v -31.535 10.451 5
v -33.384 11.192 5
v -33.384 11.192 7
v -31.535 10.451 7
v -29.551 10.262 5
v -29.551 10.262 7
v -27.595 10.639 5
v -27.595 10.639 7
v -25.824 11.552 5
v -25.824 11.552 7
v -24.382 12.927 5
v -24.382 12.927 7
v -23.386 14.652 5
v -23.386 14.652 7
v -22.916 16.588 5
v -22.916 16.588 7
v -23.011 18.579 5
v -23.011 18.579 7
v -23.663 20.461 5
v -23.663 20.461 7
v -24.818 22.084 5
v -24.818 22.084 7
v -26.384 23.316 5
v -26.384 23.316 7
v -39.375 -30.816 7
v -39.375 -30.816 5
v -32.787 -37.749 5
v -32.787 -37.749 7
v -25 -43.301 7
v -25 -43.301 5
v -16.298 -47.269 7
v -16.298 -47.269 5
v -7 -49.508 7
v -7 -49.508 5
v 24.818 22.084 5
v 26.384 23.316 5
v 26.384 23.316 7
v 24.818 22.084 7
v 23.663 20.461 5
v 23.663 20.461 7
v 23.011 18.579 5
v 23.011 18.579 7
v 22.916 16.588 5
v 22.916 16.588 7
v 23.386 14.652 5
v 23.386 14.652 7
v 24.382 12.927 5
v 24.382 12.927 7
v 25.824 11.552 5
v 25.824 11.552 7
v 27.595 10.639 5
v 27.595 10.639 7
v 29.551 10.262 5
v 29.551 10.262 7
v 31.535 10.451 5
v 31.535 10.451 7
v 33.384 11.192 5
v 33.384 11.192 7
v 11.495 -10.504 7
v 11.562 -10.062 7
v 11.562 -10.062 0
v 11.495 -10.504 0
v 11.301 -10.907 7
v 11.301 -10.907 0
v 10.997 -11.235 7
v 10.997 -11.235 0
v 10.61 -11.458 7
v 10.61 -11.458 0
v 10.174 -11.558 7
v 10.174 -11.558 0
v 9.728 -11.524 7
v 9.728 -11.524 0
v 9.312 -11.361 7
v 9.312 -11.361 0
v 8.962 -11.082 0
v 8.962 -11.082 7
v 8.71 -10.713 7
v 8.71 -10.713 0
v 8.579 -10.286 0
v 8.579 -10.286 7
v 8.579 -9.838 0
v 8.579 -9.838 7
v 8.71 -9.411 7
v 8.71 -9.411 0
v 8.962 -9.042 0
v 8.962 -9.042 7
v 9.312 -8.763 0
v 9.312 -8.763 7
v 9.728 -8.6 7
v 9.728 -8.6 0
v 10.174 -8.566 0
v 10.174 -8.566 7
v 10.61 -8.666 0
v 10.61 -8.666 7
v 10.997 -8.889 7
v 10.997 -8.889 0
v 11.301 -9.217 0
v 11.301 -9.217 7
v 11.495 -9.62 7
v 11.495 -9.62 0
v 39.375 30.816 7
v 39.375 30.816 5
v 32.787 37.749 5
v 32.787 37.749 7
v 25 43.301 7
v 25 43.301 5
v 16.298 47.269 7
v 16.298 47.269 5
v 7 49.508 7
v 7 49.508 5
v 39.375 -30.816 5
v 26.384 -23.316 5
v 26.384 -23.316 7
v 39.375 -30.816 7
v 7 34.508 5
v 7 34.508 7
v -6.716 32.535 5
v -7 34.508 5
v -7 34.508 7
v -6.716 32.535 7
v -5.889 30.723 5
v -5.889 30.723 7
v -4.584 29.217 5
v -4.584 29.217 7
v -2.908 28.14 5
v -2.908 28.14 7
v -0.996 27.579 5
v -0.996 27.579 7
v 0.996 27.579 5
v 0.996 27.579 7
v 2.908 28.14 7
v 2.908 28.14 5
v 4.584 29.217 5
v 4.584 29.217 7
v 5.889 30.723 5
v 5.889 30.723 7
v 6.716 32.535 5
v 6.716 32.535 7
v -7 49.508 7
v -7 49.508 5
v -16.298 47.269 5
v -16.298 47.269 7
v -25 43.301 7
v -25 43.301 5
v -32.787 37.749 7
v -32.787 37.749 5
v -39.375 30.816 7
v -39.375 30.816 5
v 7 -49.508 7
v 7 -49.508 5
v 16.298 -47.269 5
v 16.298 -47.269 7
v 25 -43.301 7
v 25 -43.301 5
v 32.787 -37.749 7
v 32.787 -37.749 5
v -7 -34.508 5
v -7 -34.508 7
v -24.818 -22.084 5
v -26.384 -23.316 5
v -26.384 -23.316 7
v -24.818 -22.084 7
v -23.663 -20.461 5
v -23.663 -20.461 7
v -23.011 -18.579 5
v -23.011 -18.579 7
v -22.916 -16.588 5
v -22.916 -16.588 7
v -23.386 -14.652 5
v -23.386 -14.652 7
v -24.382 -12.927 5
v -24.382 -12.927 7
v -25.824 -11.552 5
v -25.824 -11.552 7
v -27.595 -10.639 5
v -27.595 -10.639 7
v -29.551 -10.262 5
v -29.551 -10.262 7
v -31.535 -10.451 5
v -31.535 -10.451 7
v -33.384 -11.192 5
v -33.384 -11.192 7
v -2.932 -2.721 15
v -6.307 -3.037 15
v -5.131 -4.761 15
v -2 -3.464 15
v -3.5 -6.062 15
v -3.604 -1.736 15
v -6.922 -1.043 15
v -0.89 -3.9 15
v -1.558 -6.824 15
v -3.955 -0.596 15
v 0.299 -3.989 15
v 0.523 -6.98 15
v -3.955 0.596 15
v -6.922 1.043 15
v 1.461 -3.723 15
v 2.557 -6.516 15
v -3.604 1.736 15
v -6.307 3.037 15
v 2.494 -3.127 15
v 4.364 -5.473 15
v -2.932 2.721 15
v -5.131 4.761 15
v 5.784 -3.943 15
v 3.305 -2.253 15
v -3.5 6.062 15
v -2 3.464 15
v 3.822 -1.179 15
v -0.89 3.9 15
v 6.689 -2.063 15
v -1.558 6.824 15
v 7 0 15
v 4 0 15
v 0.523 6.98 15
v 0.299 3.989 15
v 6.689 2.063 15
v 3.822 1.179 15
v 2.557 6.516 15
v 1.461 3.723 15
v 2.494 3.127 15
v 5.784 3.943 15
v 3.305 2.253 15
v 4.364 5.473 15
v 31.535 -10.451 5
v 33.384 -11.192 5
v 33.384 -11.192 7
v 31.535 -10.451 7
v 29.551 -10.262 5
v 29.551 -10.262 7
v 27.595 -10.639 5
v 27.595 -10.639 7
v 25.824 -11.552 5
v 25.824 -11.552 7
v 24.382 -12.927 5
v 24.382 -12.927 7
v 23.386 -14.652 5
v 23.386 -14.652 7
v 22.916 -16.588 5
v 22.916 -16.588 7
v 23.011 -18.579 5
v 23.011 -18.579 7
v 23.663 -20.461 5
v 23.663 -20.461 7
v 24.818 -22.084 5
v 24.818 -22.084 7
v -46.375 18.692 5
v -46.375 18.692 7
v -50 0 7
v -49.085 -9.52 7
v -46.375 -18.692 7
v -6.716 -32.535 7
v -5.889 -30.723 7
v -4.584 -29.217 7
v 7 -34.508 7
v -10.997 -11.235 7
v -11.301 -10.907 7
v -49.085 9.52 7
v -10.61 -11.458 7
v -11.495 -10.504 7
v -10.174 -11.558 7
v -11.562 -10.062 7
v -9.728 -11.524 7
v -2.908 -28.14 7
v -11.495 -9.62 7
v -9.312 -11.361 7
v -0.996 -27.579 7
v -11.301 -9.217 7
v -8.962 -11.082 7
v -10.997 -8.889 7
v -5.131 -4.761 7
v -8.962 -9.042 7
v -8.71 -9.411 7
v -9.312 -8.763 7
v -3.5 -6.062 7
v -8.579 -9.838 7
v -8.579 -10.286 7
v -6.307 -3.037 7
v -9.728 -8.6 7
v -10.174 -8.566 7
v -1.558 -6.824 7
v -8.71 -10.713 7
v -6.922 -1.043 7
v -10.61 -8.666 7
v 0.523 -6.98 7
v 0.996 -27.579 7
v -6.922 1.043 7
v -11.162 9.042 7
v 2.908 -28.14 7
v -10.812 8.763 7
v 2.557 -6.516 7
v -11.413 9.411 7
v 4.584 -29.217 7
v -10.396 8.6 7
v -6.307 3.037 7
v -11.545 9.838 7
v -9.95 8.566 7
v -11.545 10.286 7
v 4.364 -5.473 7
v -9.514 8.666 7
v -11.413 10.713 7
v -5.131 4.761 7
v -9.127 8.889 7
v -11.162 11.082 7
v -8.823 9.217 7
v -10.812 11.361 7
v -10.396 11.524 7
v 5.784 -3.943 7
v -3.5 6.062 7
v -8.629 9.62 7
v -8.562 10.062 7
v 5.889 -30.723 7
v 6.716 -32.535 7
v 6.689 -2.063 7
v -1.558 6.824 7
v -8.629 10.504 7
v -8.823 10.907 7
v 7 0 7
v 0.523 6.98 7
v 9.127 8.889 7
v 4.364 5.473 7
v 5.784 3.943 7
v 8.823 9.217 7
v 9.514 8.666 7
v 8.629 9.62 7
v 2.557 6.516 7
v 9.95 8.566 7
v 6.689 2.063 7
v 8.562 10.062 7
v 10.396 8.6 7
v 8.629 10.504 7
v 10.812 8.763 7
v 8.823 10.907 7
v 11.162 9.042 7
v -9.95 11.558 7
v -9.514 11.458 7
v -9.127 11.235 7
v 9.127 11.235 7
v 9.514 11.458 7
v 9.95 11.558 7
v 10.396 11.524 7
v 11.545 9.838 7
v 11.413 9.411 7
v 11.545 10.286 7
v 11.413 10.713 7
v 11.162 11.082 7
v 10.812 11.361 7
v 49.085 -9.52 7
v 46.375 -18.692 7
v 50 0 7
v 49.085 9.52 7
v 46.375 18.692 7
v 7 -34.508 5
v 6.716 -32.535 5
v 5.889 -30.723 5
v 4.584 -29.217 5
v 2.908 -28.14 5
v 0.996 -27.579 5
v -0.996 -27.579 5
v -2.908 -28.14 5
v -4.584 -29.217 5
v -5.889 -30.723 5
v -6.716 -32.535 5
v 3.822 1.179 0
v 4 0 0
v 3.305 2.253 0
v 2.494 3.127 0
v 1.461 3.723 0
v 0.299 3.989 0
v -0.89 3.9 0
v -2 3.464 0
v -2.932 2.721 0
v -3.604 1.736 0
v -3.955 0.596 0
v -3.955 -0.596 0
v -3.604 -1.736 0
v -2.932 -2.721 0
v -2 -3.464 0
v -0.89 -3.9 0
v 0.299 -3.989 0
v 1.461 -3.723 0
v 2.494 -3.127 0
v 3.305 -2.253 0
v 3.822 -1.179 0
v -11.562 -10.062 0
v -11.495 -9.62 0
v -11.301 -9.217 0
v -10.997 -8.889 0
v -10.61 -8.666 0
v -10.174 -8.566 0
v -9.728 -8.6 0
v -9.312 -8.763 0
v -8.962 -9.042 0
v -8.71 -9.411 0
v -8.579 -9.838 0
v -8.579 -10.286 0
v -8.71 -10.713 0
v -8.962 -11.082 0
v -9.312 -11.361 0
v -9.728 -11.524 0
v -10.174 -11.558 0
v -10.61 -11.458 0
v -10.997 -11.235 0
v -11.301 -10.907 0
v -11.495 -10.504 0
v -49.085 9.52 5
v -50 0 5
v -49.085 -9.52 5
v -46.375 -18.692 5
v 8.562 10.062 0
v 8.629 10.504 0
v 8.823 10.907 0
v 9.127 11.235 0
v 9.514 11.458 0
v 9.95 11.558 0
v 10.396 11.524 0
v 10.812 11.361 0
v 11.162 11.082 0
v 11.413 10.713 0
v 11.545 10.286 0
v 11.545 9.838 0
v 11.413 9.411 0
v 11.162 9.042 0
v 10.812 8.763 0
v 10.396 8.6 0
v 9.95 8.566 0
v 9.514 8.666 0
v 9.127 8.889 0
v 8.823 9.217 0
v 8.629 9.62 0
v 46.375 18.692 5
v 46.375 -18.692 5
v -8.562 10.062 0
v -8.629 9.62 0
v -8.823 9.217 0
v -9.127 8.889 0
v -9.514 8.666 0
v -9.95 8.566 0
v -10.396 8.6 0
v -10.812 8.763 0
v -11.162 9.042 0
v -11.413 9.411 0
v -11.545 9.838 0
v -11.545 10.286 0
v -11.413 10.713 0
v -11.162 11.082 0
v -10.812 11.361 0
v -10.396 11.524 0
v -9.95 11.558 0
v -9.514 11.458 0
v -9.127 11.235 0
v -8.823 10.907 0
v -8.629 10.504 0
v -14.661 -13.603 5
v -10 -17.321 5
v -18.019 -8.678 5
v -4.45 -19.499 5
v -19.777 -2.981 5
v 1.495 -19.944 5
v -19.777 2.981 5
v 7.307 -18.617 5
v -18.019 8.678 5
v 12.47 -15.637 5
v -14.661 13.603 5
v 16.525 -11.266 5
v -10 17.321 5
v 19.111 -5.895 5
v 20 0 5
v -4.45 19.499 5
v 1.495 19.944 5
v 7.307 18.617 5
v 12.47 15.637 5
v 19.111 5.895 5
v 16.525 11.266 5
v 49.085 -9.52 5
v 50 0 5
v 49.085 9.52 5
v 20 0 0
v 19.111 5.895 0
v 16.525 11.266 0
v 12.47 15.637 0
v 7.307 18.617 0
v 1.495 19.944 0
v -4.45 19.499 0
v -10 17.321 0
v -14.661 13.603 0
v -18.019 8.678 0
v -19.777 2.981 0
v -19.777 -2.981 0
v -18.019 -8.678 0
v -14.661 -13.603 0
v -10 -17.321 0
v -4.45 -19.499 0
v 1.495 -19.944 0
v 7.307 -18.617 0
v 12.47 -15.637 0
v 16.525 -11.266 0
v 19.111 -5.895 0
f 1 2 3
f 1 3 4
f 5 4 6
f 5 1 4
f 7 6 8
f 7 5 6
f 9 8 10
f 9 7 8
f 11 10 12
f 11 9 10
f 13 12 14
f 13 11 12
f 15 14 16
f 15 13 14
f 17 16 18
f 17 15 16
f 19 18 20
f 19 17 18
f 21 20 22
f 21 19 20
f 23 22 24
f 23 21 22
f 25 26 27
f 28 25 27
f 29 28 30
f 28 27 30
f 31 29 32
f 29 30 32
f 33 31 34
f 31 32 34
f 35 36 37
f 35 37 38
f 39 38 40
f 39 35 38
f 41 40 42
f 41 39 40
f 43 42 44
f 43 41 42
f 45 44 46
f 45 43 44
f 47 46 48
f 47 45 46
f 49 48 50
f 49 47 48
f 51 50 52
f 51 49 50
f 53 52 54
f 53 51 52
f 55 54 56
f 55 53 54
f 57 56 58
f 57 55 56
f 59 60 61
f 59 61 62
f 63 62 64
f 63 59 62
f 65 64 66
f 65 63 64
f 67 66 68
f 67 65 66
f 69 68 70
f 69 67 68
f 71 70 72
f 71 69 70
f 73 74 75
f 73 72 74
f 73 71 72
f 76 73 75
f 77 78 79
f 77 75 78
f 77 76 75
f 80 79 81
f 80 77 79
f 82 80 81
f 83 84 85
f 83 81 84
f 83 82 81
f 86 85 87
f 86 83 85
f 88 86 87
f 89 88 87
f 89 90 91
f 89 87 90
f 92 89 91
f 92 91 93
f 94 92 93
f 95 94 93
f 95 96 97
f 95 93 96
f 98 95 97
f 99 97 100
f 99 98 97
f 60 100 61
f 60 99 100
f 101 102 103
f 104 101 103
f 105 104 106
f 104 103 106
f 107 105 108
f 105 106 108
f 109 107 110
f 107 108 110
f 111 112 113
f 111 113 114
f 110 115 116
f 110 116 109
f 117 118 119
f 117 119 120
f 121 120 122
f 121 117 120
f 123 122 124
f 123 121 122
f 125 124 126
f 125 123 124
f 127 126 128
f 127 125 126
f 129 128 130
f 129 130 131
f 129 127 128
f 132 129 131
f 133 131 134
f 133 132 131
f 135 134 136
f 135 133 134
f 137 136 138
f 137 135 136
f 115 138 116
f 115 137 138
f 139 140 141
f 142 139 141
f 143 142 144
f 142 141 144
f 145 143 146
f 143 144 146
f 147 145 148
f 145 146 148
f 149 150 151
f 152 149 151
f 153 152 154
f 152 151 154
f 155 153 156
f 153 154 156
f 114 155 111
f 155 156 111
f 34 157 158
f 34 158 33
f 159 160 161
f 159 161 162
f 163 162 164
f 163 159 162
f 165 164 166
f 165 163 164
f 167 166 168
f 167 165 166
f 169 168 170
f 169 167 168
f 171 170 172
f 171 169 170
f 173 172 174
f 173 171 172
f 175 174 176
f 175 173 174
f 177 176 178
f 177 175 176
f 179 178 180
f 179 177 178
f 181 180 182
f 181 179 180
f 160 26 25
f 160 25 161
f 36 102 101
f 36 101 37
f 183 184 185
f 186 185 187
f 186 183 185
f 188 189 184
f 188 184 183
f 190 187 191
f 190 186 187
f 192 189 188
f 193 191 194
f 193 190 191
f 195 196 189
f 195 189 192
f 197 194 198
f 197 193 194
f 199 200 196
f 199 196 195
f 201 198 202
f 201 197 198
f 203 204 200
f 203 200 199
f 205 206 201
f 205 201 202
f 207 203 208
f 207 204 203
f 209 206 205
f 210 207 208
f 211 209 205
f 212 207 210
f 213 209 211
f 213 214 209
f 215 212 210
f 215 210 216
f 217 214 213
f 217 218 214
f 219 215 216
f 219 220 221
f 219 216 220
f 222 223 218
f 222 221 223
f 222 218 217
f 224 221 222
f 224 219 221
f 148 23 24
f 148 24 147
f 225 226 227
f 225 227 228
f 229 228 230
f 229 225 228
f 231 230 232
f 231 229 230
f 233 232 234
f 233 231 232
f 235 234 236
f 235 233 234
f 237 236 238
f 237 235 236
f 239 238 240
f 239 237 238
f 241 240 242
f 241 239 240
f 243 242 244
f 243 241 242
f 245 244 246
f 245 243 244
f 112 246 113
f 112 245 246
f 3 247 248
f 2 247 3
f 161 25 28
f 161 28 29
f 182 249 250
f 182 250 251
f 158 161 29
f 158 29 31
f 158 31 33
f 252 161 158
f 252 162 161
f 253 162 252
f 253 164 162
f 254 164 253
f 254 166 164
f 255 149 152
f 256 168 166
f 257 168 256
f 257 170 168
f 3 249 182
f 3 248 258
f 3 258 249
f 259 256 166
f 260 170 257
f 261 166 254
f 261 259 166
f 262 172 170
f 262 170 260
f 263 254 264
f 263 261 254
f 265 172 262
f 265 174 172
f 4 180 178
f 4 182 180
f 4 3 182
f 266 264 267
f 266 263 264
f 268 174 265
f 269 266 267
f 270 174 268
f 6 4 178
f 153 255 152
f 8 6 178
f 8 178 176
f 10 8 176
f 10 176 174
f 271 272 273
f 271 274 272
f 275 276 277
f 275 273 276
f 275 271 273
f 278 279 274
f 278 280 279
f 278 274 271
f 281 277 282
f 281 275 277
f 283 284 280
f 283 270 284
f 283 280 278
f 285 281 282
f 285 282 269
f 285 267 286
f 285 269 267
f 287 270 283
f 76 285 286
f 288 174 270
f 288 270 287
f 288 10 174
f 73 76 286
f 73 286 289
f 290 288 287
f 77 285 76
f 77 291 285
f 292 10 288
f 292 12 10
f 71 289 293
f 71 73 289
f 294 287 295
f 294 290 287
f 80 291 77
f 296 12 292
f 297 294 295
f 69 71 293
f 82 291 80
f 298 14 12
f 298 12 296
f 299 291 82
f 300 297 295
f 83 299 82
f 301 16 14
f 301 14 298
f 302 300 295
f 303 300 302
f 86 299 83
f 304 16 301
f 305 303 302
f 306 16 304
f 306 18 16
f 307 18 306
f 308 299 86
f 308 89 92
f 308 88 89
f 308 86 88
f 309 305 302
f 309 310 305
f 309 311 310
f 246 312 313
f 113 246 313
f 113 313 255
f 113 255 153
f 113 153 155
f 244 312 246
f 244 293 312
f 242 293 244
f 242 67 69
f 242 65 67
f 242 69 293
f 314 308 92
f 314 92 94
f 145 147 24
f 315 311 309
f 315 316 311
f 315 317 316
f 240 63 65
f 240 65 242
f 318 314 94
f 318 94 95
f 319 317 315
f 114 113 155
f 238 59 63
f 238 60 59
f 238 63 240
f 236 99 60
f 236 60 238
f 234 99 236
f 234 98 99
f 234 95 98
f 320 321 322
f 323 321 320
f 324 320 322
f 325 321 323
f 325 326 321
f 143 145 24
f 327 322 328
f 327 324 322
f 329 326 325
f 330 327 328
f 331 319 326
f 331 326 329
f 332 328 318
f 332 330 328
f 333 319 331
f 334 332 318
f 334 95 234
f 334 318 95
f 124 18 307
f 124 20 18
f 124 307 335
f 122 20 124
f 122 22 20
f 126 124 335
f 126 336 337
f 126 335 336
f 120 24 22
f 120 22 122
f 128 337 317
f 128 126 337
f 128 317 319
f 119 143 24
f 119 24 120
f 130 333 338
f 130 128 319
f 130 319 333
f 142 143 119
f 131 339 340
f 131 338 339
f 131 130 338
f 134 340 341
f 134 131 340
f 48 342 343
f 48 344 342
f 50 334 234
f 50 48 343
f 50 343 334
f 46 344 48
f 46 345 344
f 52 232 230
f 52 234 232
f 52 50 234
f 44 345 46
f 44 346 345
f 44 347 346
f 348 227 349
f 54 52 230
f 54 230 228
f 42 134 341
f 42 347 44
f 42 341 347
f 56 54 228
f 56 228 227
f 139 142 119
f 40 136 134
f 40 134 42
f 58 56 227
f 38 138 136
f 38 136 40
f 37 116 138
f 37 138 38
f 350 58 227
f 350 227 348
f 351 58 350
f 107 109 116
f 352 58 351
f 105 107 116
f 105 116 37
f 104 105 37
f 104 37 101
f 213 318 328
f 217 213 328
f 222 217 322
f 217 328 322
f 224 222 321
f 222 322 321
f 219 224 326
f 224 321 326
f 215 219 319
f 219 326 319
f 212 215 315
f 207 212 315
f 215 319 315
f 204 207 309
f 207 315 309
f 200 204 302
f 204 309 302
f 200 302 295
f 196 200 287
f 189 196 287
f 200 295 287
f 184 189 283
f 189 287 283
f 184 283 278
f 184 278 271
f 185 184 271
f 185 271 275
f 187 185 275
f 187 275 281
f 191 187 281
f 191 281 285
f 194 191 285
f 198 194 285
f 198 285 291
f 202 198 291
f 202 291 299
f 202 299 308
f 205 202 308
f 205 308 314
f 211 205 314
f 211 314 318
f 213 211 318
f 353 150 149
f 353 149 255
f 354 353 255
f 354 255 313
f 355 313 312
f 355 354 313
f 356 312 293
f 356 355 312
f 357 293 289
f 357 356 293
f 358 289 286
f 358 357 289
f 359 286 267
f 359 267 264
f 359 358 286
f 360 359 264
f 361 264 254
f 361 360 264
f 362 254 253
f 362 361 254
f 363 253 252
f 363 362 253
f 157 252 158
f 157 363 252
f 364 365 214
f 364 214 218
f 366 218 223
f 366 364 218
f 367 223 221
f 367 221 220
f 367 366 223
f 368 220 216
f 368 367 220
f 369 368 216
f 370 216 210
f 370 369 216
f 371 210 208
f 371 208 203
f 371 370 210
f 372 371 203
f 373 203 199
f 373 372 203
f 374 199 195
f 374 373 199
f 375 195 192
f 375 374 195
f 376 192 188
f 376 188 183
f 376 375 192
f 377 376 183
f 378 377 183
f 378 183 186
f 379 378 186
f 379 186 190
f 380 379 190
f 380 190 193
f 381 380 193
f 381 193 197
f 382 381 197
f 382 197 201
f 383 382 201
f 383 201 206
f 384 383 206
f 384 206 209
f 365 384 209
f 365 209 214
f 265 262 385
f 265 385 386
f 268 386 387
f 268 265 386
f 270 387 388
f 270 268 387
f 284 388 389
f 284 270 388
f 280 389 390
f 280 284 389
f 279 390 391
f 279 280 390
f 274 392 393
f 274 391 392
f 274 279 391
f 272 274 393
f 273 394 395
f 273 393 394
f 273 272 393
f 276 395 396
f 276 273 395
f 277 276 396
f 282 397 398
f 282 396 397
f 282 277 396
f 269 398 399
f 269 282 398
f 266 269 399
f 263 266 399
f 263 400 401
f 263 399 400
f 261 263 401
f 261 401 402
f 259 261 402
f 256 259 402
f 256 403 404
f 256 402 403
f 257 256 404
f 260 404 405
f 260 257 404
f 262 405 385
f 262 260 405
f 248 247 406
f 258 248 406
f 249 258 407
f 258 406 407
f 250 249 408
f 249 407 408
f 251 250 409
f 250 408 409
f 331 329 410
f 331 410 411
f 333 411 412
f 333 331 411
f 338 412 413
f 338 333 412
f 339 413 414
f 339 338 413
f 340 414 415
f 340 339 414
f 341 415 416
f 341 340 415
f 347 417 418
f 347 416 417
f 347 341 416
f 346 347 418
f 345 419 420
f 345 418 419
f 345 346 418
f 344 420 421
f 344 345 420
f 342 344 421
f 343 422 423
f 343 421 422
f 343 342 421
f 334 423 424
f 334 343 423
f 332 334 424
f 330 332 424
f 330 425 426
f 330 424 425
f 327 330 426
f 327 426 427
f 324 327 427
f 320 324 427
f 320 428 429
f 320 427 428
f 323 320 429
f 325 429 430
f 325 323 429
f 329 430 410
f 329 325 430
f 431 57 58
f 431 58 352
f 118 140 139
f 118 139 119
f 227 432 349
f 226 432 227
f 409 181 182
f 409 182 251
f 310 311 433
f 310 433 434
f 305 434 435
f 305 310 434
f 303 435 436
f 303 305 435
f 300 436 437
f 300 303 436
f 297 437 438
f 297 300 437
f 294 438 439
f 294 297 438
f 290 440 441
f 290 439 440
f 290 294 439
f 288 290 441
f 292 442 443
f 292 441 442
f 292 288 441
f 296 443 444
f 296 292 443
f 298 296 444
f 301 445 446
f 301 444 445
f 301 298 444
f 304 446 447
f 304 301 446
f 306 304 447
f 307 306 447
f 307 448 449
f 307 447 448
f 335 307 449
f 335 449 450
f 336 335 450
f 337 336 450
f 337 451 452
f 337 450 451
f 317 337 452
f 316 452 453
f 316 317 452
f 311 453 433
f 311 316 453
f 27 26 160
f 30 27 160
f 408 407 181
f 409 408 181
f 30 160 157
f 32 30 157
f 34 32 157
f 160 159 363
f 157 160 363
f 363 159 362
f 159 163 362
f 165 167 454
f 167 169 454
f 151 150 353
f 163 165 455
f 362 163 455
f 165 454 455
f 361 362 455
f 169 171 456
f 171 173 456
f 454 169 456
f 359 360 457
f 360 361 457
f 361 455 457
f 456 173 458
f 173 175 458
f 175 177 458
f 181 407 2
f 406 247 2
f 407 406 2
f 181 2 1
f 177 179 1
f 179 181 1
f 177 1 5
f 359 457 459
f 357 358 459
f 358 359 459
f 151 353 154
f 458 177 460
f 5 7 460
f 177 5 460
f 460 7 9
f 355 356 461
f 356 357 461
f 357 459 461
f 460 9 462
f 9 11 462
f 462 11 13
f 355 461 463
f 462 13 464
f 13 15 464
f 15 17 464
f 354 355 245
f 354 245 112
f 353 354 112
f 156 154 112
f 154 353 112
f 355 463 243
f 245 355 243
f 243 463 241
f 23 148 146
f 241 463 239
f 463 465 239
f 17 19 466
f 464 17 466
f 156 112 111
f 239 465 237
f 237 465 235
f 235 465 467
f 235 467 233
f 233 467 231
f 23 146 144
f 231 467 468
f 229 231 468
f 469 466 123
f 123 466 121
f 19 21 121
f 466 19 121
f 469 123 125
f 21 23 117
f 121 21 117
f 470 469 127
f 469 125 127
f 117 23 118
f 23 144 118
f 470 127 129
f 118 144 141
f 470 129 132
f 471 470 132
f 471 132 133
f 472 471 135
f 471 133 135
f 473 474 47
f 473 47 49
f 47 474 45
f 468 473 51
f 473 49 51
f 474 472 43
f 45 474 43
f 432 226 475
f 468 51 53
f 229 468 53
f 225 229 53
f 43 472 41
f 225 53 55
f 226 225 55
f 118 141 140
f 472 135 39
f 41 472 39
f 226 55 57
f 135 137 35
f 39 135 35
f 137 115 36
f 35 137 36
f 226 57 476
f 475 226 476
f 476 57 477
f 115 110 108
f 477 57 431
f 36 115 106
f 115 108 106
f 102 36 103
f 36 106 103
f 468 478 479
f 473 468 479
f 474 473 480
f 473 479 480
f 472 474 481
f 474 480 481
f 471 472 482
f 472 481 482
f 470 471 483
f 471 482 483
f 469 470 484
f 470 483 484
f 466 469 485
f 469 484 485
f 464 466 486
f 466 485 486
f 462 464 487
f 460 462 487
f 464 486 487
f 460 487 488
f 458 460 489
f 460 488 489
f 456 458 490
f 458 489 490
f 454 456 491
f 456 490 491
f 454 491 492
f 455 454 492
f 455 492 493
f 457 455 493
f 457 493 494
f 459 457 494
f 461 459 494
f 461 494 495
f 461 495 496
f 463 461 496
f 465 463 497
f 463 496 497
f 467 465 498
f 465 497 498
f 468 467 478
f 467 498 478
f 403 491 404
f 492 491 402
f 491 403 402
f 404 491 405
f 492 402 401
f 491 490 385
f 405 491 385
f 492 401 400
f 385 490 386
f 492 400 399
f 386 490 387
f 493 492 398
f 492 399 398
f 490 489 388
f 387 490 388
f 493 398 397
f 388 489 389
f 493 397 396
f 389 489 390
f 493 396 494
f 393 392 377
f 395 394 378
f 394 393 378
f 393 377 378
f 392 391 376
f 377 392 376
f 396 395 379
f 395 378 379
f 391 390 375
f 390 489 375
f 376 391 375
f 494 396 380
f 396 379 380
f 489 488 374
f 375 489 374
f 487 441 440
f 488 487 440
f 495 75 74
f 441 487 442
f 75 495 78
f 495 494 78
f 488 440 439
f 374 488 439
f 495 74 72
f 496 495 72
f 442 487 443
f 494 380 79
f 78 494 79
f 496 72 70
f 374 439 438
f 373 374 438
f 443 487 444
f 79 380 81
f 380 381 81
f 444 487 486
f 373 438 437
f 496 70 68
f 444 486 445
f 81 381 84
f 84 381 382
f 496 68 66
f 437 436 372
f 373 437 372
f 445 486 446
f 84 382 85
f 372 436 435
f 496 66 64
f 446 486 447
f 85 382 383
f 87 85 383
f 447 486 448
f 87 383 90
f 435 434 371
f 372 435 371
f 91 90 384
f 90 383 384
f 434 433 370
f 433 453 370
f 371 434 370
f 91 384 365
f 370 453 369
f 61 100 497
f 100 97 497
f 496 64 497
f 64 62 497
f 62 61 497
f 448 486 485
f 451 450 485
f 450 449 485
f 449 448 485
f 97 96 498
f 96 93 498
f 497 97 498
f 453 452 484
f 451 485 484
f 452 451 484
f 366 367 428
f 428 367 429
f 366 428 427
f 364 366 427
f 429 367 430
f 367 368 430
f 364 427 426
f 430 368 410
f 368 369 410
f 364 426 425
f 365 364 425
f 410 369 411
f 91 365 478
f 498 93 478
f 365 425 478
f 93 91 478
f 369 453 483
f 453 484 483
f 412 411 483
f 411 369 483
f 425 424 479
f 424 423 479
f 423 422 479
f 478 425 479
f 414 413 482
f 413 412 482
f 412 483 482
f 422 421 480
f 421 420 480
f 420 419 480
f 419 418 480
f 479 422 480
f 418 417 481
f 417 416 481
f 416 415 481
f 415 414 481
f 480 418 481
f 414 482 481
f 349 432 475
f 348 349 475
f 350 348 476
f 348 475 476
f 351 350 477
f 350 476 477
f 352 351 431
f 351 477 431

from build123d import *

# Parameters (mm, degrees)
SKETCH1_R               = 20
SKETCH1_R_2             = 4
SKETCH1_R_3             = 1.5
BOSS_EXTRUDE1_DEPTH     = 5
SKETCH2_R               = 7
SKETCH2_R_2             = 4
BOSS_EXTRUDE2_DEPTH     = 10
SKETCH3_R               = 50
SKETCH3_R_2             = 4
BOSS_EXTRUDE3_DEPTH     = 2
CUT_EXTRUDE1_START      = -2
CUT_EXTRUDE1_DEPTH      = 2
CUT_EXTRUDE2_DEPTH      = 72.944422994
CUT_EXTRUDE2_DEPTH_BACK = 72.944422994
SKETCH5_R               = 1.5


with BuildPart() as part:
    # Sketch1 → Boss-Extrude1 (new body)
    with BuildSketch(Plane.XY):
        Circle(SKETCH1_R)
        Circle(SKETCH1_R_2, mode=Mode.SUBTRACT)
        with Locations((-10.061951403, 10.061951403)):
            Circle(SKETCH1_R_3, mode=Mode.SUBTRACT)
        with Locations(Location((10.061951403, 10.061951403, 0), (0, 0, 180))):
            Circle(SKETCH1_R_3, mode=Mode.SUBTRACT)
        with Locations((10.061951403, -10.061951403)):
            Circle(SKETCH1_R_3, mode=Mode.SUBTRACT)
        with Locations(Location((-10.061951403, -10.061951403, 0), (0, 0, 180))):
            Circle(SKETCH1_R_3, mode=Mode.SUBTRACT)
    extrude(amount=BOSS_EXTRUDE1_DEPTH)

    # Sketch2 → Boss-Extrude2 (add)
    with BuildSketch(Plane.XY.offset(5)):
        Circle(SKETCH2_R)
        Circle(SKETCH2_R_2, mode=Mode.SUBTRACT)
    extrude(amount=BOSS_EXTRUDE2_DEPTH)

    # Sketch3 → Boss-Extrude3 (add)
    with BuildSketch(Plane.XY.offset(5)):
        Circle(SKETCH3_R)
        Circle(SKETCH3_R_2, mode=Mode.SUBTRACT)
    extrude(amount=BOSS_EXTRUDE3_DEPTH)

    # Sketch4 → Cut-Extrude1 (cut)
    with BuildSketch(Plane.XY.offset(7).offset(CUT_EXTRUDE1_START)):
        with BuildLine():
            Line((-7, 49.507575178), (-7, 34.507575178))
            ThreePointArc((-7, 34.507575178), (0, 27.507575178), (7, 34.507575178))
            Line((7, 34.507575178), (7, 49.507575178))
            ThreePointArc((7, 49.507575178), (0, 50), (-7, 49.507575178))
        make_face()
        with BuildLine():
            Line((39.374817784, 30.815965415), (26.384436727, 23.315965415))
            ThreePointArc((26.384436727, 23.315965415), (23.822258901, 13.753787589), (33.384436727, 11.191609762))
            Line((33.384436727, 11.191609762), (46.374817784, 18.691609762))
            ThreePointArc((46.374817784, 18.691609762), (43.301270189, 25), (39.374817784, 30.815965415))
        make_face()
        with BuildLine():
            Line((46.374817784, -18.691609762), (33.384436727, -11.191609762))
            ThreePointArc((33.384436727, -11.191609762), (23.822258901, -13.753787589), (26.384436727, -23.315965415))
            Line((26.384436727, -23.315965415), (39.374817784, -30.815965415))
            ThreePointArc((39.374817784, -30.815965415), (43.301270189, -25), (46.374817784, -18.691609762))
        make_face()
        with BuildLine():
            Line((7, -49.507575178), (7, -34.507575178))
            ThreePointArc((7, -34.507575178), (0, -27.507575178), (-7, -34.507575178))
            Line((-7, -34.507575178), (-7, -49.507575178))
            ThreePointArc((-7, -49.507575178), (0, -50), (7, -49.507575178))
        make_face()
        with BuildLine():
            Line((-39.374817784, -30.815965415), (-26.384436727, -23.315965415))
            ThreePointArc((-26.384436727, -23.315965415), (-23.822258901, -13.753787589), (-33.384436727, -11.191609762))
            Line((-33.384436727, -11.191609762), (-46.374817784, -18.691609762))
            ThreePointArc((-46.374817784, -18.691609762), (-43.301270189, -25), (-39.374817784, -30.815965415))
        make_face()
        with BuildLine():
            Line((-46.374817784, 18.691609762), (-33.384436727, 11.191609762))
            ThreePointArc((-33.384436727, 11.191609762), (-23.822258901, 13.753787589), (-26.384436727, 23.315965415))
            Line((-26.384436727, 23.315965415), (-39.374817784, 30.815965415))
            ThreePointArc((-39.374817784, 30.815965415), (-43.301270189, 25), (-46.374817784, 18.691609762))
        make_face()
    extrude(amount=CUT_EXTRUDE1_DEPTH, mode=Mode.SUBTRACT)

    # Sketch5 → Cut-Extrude2 (cut, two sides: drawn at the far end of the back side and taken through both)
    with BuildSketch(Plane(origin=(0, 0, 0), x_dir=(-1, 0, 0), z_dir=(0, 0, -1)).offset(-CUT_EXTRUDE2_DEPTH_BACK)):
        with Locations((-10.061951403, 10.061951403)):
            Circle(SKETCH5_R)
        with Locations(Location((-10.061951403, -10.061951403, 0), (0, 0, 180))):
            Circle(SKETCH5_R)
        with Locations(Location((10.061951403, 10.061951403, 0), (0, 0, 180))):
            Circle(SKETCH5_R)
        with Locations((10.061951403, -10.061951403)):
            Circle(SKETCH5_R)
    extrude(amount=CUT_EXTRUDE2_DEPTH + CUT_EXTRUDE2_DEPTH_BACK, mode=Mode.SUBTRACT)


solid = part.part
